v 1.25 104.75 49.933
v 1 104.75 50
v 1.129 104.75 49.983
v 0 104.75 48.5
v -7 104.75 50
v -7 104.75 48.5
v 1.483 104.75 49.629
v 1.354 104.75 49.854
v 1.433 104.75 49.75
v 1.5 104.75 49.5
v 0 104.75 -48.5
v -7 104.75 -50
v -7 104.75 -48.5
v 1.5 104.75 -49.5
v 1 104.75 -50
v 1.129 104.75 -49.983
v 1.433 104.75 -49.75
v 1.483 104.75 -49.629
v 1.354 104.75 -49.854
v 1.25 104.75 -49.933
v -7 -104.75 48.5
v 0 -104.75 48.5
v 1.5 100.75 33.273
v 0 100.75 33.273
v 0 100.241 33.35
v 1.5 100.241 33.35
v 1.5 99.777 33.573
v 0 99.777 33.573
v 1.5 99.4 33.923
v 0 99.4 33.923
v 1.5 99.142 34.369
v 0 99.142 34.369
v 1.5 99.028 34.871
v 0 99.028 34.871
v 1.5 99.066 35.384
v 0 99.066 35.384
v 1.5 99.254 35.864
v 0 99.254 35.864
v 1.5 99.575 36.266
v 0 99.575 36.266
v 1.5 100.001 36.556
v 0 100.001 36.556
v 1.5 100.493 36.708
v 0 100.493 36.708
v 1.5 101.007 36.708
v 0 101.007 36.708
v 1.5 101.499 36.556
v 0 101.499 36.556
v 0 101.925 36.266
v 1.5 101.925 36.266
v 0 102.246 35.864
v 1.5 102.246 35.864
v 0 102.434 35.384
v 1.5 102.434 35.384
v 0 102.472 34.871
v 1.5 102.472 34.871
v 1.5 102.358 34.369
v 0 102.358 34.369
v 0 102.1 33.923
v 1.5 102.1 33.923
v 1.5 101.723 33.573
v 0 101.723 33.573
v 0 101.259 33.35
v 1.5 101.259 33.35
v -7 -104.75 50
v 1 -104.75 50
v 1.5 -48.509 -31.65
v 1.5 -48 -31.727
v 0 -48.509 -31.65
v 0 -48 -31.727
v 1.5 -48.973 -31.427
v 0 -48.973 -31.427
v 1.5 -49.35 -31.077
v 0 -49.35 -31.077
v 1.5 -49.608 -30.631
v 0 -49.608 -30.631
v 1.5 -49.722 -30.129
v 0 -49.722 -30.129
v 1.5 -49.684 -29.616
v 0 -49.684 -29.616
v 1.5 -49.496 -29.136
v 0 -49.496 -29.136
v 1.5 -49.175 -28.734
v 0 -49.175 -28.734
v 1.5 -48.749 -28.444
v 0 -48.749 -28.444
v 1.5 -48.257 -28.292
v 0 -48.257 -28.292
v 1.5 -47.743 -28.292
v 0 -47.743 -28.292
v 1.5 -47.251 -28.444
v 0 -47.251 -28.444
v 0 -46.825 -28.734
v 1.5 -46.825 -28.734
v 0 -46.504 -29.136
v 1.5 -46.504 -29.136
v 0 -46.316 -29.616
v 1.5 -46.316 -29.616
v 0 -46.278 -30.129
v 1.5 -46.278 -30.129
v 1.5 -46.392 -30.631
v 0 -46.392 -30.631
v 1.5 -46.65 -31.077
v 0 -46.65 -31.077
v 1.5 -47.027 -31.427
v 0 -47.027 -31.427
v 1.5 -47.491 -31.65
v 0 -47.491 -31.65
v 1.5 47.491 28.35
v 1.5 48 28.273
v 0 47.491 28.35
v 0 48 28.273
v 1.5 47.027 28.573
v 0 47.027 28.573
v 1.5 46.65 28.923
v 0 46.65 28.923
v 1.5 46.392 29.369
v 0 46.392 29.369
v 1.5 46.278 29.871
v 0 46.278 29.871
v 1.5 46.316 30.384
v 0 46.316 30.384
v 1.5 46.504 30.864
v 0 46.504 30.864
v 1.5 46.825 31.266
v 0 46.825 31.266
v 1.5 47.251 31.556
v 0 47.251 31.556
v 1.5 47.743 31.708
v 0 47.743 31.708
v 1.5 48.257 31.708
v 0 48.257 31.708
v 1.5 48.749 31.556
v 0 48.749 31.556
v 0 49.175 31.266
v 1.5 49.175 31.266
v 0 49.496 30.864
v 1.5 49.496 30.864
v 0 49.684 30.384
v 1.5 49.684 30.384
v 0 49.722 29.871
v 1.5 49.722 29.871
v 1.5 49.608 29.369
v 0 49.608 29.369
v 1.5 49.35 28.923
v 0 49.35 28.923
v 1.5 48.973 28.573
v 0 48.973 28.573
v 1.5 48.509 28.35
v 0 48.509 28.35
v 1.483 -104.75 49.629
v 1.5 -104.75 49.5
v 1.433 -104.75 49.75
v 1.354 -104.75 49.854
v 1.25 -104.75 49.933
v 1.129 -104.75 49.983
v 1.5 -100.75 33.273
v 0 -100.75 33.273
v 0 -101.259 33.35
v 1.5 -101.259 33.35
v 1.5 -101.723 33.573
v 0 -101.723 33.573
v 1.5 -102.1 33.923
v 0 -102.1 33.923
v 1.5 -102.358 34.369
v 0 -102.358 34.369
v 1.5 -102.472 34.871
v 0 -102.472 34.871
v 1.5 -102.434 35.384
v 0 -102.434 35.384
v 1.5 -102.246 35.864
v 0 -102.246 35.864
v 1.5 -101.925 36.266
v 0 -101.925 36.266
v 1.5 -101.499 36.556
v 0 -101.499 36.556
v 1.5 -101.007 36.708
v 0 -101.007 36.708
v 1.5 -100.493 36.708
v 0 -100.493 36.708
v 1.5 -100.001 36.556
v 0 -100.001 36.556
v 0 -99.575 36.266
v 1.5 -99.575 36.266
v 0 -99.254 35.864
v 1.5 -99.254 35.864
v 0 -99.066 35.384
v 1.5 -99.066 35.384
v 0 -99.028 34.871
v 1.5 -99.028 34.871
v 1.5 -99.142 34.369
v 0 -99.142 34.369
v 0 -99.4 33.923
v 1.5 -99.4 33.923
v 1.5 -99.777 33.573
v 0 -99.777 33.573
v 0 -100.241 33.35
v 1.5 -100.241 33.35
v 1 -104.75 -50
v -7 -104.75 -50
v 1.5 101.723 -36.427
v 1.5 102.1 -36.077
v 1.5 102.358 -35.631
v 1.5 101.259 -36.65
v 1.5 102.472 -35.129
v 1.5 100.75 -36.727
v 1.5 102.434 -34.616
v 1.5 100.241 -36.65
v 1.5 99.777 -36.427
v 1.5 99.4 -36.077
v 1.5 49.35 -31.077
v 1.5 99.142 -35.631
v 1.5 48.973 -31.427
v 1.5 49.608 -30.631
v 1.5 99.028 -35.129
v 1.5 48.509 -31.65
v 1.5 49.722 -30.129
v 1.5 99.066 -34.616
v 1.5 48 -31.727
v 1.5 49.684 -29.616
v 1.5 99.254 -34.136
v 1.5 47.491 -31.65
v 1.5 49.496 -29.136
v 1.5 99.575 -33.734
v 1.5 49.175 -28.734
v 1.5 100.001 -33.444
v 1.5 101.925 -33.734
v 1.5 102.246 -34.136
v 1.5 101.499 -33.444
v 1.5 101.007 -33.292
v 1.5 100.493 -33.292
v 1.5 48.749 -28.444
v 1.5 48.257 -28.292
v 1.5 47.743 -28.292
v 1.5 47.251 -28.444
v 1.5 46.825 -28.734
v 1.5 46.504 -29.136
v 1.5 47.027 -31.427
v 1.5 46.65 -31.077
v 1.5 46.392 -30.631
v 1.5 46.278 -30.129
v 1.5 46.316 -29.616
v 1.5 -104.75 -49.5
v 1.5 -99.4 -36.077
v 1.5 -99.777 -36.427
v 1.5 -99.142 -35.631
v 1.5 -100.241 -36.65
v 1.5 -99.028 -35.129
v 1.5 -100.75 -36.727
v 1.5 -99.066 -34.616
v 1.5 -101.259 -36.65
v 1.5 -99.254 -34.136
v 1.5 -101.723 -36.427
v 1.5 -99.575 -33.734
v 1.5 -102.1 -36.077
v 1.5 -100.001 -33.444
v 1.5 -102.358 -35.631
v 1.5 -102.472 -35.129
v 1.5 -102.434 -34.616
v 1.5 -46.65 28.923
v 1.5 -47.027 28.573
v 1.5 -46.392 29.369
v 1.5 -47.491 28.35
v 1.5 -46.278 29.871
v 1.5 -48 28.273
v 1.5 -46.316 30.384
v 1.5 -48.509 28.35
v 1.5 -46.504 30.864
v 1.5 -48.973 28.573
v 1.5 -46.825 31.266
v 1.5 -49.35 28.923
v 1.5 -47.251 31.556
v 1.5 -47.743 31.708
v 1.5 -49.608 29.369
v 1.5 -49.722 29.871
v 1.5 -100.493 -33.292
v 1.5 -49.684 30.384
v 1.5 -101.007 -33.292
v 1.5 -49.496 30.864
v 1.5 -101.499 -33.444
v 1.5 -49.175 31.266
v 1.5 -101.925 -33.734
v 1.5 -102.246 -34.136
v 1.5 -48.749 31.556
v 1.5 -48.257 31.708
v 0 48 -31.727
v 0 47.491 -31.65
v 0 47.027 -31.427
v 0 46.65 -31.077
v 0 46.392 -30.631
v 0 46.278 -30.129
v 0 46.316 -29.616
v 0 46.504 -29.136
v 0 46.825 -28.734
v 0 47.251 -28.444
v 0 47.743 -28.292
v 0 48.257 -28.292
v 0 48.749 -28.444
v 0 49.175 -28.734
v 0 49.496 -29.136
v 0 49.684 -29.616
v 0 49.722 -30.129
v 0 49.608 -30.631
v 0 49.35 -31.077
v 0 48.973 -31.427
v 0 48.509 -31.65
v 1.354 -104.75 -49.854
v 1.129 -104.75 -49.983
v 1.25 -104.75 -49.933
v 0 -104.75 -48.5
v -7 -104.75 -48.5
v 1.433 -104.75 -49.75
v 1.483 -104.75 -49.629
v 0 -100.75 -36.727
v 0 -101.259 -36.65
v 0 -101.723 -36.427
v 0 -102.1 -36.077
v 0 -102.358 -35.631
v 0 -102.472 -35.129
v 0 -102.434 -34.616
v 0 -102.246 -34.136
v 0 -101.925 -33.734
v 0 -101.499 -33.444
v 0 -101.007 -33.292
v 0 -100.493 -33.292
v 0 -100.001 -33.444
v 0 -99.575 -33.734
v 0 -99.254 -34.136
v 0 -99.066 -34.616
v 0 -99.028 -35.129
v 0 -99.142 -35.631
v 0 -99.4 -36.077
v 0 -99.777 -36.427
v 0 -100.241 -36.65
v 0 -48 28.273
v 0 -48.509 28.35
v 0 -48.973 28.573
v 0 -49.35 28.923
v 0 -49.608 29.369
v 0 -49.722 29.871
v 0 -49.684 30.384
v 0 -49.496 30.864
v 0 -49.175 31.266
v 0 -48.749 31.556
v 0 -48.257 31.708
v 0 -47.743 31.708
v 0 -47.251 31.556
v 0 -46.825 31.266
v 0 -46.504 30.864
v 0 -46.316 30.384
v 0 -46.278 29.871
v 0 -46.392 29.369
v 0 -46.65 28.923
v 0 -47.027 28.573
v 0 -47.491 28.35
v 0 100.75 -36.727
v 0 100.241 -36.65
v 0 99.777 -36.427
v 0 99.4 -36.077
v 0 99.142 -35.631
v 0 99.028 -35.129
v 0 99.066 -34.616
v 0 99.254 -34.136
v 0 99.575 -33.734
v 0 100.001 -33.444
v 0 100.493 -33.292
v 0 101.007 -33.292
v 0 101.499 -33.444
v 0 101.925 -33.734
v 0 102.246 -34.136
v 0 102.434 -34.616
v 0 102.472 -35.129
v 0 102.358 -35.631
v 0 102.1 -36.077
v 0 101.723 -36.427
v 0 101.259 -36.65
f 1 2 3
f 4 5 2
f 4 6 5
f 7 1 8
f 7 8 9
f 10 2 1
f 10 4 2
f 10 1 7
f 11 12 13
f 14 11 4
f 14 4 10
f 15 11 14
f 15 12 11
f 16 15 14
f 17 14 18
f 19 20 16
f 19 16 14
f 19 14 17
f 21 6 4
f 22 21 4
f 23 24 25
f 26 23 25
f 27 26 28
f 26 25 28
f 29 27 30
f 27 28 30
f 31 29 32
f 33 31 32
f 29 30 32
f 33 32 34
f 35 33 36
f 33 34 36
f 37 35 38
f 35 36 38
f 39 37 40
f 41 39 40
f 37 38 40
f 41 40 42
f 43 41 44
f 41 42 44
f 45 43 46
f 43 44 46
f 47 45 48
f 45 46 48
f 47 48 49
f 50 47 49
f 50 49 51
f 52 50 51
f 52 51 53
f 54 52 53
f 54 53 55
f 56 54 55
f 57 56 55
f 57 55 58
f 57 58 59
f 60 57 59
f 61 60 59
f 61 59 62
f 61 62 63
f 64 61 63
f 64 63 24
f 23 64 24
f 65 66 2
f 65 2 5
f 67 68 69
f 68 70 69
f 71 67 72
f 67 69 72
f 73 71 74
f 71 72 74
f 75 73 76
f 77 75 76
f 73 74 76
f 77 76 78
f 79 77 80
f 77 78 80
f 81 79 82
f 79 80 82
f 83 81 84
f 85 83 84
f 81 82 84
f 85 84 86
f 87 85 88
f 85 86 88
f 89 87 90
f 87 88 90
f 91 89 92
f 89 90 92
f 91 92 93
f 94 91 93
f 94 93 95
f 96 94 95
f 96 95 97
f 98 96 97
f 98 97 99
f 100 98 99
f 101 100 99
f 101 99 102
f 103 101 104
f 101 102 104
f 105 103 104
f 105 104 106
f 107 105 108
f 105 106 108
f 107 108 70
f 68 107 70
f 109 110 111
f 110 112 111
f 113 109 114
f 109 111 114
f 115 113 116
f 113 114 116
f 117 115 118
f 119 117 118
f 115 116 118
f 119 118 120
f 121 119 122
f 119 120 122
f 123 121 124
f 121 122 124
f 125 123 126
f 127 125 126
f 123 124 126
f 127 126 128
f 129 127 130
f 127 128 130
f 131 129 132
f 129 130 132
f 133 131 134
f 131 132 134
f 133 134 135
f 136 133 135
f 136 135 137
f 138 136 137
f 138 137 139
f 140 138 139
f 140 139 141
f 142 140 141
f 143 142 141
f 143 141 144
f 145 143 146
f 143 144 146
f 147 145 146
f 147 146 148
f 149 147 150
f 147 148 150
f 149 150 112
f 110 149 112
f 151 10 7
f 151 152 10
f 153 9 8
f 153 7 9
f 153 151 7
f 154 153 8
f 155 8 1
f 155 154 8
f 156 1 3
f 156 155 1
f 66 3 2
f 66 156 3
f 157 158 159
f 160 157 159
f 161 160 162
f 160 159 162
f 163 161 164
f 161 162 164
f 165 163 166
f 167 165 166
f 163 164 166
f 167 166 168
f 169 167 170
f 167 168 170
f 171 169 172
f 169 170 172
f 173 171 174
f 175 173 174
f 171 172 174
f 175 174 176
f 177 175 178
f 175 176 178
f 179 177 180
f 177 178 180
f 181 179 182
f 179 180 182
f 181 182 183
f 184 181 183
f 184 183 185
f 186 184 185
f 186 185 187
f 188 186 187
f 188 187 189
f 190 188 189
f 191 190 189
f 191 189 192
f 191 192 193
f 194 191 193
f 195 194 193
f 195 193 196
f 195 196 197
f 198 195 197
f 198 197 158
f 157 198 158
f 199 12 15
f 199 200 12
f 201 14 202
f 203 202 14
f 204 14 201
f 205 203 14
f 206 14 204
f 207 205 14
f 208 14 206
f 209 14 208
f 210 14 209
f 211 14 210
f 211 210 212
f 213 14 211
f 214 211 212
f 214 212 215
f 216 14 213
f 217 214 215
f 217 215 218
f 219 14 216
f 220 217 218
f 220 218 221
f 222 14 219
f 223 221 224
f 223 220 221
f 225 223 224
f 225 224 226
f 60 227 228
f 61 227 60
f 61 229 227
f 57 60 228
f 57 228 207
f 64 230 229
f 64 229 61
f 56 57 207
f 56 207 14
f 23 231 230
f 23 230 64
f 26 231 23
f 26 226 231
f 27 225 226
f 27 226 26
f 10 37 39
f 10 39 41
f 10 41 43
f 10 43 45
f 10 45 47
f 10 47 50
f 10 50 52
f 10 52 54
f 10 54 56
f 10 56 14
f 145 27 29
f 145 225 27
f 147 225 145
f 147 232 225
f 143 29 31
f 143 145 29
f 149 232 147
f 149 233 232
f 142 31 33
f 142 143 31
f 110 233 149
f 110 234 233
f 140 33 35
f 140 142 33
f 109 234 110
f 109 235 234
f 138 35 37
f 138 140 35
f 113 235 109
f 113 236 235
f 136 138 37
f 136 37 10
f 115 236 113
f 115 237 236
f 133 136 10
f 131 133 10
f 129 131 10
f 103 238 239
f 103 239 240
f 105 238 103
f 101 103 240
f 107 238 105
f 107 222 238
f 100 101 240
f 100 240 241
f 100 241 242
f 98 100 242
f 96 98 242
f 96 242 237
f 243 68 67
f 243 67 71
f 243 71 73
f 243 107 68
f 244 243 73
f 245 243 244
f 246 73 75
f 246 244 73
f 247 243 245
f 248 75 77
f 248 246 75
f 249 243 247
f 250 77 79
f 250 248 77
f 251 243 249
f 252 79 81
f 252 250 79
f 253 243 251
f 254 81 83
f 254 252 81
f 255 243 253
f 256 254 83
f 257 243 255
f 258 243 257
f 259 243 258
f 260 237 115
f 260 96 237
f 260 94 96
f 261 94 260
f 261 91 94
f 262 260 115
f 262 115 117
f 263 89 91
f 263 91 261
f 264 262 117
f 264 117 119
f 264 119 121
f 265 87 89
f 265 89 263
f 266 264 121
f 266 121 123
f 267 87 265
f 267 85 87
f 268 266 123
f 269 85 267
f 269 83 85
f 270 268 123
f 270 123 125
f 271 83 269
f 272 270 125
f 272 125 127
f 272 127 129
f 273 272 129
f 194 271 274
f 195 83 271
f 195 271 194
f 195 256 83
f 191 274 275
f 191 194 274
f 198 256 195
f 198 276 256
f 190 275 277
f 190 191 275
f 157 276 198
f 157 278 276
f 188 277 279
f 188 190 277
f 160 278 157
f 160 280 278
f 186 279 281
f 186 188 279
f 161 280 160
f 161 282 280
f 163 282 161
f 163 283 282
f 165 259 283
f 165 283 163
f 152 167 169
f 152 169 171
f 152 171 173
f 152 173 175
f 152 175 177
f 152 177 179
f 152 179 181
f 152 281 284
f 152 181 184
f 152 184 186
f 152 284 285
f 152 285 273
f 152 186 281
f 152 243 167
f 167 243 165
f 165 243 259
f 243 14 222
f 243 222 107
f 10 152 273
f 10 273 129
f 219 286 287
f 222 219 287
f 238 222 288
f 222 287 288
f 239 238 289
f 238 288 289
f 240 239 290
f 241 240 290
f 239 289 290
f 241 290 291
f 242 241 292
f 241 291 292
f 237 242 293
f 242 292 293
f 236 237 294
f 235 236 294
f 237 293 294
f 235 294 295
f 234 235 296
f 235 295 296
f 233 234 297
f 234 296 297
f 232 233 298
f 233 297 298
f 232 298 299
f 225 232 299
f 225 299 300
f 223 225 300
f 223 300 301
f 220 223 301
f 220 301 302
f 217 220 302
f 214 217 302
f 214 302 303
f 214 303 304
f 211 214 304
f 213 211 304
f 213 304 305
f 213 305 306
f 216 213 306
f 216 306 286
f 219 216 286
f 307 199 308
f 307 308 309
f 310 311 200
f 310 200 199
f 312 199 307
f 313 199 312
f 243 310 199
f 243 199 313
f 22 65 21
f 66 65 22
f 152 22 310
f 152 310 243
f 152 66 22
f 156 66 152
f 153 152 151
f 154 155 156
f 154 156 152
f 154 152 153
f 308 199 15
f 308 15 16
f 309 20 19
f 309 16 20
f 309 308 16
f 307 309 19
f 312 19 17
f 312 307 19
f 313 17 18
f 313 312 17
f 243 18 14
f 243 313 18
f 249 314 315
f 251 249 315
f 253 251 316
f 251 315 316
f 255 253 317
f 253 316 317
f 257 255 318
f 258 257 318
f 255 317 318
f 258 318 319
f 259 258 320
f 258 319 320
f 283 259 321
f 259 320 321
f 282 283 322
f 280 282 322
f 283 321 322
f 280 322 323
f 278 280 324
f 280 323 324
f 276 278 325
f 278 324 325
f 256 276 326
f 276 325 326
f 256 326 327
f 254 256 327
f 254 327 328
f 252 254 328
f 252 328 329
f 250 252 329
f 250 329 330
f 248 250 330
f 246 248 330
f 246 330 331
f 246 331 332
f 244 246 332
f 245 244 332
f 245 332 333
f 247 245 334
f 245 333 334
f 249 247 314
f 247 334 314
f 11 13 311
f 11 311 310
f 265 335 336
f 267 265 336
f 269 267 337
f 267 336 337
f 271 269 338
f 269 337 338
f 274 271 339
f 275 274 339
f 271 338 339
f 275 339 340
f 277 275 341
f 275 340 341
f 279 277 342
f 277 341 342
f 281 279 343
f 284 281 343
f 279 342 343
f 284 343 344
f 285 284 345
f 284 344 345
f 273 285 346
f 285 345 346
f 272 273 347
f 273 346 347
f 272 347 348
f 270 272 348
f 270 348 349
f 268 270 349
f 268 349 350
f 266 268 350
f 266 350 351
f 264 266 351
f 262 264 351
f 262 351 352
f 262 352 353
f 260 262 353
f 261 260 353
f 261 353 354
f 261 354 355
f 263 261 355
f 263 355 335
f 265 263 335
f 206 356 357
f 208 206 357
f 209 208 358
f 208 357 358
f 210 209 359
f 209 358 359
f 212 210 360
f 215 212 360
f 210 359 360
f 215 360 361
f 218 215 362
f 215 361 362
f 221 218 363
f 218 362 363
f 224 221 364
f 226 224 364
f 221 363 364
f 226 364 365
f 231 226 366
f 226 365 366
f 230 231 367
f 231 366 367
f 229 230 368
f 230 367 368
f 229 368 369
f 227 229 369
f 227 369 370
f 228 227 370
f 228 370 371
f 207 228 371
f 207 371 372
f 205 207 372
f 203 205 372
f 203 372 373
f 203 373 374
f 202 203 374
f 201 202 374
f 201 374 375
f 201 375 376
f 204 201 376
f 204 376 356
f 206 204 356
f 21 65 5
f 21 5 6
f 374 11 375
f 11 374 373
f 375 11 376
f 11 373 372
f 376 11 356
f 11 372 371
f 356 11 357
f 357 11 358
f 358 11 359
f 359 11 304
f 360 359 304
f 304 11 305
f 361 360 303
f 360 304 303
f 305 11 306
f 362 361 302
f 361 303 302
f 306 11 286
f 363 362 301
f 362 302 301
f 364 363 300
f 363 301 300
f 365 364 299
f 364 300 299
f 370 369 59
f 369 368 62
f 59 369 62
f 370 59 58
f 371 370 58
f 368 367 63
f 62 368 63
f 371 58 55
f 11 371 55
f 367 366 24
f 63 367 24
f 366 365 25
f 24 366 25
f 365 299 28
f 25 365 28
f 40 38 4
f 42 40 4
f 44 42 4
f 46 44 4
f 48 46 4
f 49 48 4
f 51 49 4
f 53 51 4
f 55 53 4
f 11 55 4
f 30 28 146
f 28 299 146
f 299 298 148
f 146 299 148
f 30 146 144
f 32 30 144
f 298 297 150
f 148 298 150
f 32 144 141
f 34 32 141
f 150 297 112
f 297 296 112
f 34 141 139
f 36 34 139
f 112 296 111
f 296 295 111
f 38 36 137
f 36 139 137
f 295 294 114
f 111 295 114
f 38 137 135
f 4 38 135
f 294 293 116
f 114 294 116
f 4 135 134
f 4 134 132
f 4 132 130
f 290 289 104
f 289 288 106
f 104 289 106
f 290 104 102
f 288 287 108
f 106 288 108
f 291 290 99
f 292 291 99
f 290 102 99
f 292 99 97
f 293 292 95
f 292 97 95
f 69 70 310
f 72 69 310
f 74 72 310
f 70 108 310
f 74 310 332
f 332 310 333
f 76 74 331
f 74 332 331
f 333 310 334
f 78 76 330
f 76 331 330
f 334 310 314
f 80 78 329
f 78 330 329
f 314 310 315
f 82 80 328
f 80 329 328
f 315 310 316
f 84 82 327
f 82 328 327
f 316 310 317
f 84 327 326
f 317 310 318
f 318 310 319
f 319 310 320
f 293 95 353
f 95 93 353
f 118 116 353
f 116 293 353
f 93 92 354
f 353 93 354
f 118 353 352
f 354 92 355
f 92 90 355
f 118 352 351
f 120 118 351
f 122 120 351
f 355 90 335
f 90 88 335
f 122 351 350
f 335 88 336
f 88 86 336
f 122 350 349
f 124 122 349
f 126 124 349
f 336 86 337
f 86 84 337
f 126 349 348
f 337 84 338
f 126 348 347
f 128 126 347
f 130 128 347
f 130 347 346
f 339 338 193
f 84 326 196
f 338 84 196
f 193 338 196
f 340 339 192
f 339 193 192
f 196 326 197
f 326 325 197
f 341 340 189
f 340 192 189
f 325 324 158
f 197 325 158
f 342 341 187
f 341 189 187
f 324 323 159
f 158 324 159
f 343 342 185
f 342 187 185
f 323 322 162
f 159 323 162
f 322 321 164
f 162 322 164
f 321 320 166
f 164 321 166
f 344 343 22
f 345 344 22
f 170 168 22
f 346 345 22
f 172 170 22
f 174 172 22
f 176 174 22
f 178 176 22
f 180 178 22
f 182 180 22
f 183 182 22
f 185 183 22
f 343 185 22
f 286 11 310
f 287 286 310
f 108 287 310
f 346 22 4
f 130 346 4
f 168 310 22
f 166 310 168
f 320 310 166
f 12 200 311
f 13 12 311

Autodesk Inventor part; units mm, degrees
ref_plane "YZ Plane" through (0, 0, 0) normal (1, 0, 0) x (0, 1, 0)
ref_plane "XZ Plane" through (0, 0, 0) normal (0, 1, 0) x (-1, 0, 0)
ref_plane "XY Plane" through (0, 0, 0) normal (0, 0, 1) x (1, 0, 0)
sketch "Sketch1" plane through (0, 0, 0) normal (1, 0, 0) x (0, 1, 0)
  line L0 (48, 50) -> (-48, 50)
  line L1 (-48, 50) -> (-48, -50)
  line L2 (-48, -50) -> (48, -50)
  line L3 (48, -50) -> (48, 50)
  point P0 (0, 0)
  dimension "d0" = 96
  dimension "d1" = 100
  dimension "d2" = 50
  dimension "d3" = 48
extrude "Extrusion1" add sketch "Sketch1" along normal blind 1.5
sketch "Sketch2" plane through (0, -48, 50) normal (0, 0, 1) x (1, 0, 0)
  line L0 (0, 96) -> (1.5, 96) projected
  line L1 (1.5, 96) -> (-7, 96)
  line L2 (-7, 96) -> (-7, 0)
  line L3 (-7, 0) -> (1.5, 0)
  line L4 (1.5, 0) -> (1.5, 96)
  point P0 (0, 48)
  dimension "d6" = 8.5
  dimension "d7" = 96
extrude "Extrusion2" add sketch "Sketch2" against normal blind 1.5
mirror "Mirror1" about plane through (0, 0, 0) normal (0, 0, 1) of "Extrusion2"
fillet "Fillet1" radius 0.5 2 edges at (1.5, 0, 50) (1.5, 0, -50)
sketch "Sketch9" plane through (-7, -48, 48.5) normal (0, -1, 0) x (1, 0, 0)
  arc A0 (8, -98.5) -> (8.5, -98) centre (8, -98) ccw projected
  line L0 (8.5, 1) -> (8.5, -98) projected
  arc A1 (8.5, 1) -> (8, 1.5) centre (8, 1) ccw projected
  line L1 (0, 1.5) -> (8, 1.5) projected
  line L2 (0, 1.5) -> (0, 0) projected
  line L3 (7, 0) -> (0, 0) projected
  line L4 (7, 0) -> (7, -97) projected
  line L5 (7, -97) -> (0, -97) projected
  line L6 (0, -98.5) -> (0, -97) projected
  line L7 (0, -98.5) -> (8, -98.5) projected
  point P0 (7, -48.5)
extrude "Extrusion6" add sketch "Sketch9" along normal blind 56.75
sketch "Sketch10" plane through (-7, 48, 48.5) normal (0, 1, 0) x (1, 0, 0)
  arc A0 (8.5, 98) -> (8, 98.5) centre (8, 98) ccw projected
  line L0 (0, 98.5) -> (8, 98.5) projected
  line L1 (0, 98.5) -> (0, 97) projected
  line L2 (0, 97) -> (7, 97) projected
  line L3 (7, 97) -> (7, 0) projected
  line L4 (0, 0) -> (7, 0) projected
  line L5 (0, -1.5) -> (0, 0) projected
  line L6 (8, -1.5) -> (0, -1.5) projected
  arc A1 (8, -1.5) -> (8.5, -1) centre (8, -1) ccw projected
  line L7 (8.5, 98) -> (8.5, -1) projected
  point P0 (7, 48.5)
extrude "Extrusion7" add sketch "Sketch10" along normal blind 56.75
sketch "Sketch11" plane through (1.5, 0, 0) normal (1, 0, 0) x (0, 0, -1)
  circle A0 centre (35, -100.75) radius 3 projected
  circle A1 centre (-35, -100.75) radius 3 projected
  circle A2 centre (-30, -48) radius 3 projected
  circle A3 centre (30, -48) radius 3 projected
  circle A4 centre (30, 48) radius 3 projected
  circle A5 centre (-30, 48) radius 3 projected
  circle A6 centre (35, 100.75) radius 3 projected
  circle A7 centre (-35, 100.75) radius 3 projected
  point P0 (0, 0)
hole "Hole5" at (1.5, -100.75, -35) at (1.5, -100.75, 35) at (1.5, -48, 30) at (1.5, -48, -30) at (1.5, 48, 30) at (1.5, 48, -30) at (1.5, 100.75, 35) at (1.5, 100.75, -35) direction (-1, 0, 0) diameter 3.454 end through all clearance for "Flat Head Machine Screw (82)" size "#4" standard "Ansi Unified Screw Threads"
equation "\"d2\" = 0.5 * d1"
equation "\"d3\" = 0.5 * d0"
properties part number "memesat shear panel type 1" material "Aluminum 6061"
